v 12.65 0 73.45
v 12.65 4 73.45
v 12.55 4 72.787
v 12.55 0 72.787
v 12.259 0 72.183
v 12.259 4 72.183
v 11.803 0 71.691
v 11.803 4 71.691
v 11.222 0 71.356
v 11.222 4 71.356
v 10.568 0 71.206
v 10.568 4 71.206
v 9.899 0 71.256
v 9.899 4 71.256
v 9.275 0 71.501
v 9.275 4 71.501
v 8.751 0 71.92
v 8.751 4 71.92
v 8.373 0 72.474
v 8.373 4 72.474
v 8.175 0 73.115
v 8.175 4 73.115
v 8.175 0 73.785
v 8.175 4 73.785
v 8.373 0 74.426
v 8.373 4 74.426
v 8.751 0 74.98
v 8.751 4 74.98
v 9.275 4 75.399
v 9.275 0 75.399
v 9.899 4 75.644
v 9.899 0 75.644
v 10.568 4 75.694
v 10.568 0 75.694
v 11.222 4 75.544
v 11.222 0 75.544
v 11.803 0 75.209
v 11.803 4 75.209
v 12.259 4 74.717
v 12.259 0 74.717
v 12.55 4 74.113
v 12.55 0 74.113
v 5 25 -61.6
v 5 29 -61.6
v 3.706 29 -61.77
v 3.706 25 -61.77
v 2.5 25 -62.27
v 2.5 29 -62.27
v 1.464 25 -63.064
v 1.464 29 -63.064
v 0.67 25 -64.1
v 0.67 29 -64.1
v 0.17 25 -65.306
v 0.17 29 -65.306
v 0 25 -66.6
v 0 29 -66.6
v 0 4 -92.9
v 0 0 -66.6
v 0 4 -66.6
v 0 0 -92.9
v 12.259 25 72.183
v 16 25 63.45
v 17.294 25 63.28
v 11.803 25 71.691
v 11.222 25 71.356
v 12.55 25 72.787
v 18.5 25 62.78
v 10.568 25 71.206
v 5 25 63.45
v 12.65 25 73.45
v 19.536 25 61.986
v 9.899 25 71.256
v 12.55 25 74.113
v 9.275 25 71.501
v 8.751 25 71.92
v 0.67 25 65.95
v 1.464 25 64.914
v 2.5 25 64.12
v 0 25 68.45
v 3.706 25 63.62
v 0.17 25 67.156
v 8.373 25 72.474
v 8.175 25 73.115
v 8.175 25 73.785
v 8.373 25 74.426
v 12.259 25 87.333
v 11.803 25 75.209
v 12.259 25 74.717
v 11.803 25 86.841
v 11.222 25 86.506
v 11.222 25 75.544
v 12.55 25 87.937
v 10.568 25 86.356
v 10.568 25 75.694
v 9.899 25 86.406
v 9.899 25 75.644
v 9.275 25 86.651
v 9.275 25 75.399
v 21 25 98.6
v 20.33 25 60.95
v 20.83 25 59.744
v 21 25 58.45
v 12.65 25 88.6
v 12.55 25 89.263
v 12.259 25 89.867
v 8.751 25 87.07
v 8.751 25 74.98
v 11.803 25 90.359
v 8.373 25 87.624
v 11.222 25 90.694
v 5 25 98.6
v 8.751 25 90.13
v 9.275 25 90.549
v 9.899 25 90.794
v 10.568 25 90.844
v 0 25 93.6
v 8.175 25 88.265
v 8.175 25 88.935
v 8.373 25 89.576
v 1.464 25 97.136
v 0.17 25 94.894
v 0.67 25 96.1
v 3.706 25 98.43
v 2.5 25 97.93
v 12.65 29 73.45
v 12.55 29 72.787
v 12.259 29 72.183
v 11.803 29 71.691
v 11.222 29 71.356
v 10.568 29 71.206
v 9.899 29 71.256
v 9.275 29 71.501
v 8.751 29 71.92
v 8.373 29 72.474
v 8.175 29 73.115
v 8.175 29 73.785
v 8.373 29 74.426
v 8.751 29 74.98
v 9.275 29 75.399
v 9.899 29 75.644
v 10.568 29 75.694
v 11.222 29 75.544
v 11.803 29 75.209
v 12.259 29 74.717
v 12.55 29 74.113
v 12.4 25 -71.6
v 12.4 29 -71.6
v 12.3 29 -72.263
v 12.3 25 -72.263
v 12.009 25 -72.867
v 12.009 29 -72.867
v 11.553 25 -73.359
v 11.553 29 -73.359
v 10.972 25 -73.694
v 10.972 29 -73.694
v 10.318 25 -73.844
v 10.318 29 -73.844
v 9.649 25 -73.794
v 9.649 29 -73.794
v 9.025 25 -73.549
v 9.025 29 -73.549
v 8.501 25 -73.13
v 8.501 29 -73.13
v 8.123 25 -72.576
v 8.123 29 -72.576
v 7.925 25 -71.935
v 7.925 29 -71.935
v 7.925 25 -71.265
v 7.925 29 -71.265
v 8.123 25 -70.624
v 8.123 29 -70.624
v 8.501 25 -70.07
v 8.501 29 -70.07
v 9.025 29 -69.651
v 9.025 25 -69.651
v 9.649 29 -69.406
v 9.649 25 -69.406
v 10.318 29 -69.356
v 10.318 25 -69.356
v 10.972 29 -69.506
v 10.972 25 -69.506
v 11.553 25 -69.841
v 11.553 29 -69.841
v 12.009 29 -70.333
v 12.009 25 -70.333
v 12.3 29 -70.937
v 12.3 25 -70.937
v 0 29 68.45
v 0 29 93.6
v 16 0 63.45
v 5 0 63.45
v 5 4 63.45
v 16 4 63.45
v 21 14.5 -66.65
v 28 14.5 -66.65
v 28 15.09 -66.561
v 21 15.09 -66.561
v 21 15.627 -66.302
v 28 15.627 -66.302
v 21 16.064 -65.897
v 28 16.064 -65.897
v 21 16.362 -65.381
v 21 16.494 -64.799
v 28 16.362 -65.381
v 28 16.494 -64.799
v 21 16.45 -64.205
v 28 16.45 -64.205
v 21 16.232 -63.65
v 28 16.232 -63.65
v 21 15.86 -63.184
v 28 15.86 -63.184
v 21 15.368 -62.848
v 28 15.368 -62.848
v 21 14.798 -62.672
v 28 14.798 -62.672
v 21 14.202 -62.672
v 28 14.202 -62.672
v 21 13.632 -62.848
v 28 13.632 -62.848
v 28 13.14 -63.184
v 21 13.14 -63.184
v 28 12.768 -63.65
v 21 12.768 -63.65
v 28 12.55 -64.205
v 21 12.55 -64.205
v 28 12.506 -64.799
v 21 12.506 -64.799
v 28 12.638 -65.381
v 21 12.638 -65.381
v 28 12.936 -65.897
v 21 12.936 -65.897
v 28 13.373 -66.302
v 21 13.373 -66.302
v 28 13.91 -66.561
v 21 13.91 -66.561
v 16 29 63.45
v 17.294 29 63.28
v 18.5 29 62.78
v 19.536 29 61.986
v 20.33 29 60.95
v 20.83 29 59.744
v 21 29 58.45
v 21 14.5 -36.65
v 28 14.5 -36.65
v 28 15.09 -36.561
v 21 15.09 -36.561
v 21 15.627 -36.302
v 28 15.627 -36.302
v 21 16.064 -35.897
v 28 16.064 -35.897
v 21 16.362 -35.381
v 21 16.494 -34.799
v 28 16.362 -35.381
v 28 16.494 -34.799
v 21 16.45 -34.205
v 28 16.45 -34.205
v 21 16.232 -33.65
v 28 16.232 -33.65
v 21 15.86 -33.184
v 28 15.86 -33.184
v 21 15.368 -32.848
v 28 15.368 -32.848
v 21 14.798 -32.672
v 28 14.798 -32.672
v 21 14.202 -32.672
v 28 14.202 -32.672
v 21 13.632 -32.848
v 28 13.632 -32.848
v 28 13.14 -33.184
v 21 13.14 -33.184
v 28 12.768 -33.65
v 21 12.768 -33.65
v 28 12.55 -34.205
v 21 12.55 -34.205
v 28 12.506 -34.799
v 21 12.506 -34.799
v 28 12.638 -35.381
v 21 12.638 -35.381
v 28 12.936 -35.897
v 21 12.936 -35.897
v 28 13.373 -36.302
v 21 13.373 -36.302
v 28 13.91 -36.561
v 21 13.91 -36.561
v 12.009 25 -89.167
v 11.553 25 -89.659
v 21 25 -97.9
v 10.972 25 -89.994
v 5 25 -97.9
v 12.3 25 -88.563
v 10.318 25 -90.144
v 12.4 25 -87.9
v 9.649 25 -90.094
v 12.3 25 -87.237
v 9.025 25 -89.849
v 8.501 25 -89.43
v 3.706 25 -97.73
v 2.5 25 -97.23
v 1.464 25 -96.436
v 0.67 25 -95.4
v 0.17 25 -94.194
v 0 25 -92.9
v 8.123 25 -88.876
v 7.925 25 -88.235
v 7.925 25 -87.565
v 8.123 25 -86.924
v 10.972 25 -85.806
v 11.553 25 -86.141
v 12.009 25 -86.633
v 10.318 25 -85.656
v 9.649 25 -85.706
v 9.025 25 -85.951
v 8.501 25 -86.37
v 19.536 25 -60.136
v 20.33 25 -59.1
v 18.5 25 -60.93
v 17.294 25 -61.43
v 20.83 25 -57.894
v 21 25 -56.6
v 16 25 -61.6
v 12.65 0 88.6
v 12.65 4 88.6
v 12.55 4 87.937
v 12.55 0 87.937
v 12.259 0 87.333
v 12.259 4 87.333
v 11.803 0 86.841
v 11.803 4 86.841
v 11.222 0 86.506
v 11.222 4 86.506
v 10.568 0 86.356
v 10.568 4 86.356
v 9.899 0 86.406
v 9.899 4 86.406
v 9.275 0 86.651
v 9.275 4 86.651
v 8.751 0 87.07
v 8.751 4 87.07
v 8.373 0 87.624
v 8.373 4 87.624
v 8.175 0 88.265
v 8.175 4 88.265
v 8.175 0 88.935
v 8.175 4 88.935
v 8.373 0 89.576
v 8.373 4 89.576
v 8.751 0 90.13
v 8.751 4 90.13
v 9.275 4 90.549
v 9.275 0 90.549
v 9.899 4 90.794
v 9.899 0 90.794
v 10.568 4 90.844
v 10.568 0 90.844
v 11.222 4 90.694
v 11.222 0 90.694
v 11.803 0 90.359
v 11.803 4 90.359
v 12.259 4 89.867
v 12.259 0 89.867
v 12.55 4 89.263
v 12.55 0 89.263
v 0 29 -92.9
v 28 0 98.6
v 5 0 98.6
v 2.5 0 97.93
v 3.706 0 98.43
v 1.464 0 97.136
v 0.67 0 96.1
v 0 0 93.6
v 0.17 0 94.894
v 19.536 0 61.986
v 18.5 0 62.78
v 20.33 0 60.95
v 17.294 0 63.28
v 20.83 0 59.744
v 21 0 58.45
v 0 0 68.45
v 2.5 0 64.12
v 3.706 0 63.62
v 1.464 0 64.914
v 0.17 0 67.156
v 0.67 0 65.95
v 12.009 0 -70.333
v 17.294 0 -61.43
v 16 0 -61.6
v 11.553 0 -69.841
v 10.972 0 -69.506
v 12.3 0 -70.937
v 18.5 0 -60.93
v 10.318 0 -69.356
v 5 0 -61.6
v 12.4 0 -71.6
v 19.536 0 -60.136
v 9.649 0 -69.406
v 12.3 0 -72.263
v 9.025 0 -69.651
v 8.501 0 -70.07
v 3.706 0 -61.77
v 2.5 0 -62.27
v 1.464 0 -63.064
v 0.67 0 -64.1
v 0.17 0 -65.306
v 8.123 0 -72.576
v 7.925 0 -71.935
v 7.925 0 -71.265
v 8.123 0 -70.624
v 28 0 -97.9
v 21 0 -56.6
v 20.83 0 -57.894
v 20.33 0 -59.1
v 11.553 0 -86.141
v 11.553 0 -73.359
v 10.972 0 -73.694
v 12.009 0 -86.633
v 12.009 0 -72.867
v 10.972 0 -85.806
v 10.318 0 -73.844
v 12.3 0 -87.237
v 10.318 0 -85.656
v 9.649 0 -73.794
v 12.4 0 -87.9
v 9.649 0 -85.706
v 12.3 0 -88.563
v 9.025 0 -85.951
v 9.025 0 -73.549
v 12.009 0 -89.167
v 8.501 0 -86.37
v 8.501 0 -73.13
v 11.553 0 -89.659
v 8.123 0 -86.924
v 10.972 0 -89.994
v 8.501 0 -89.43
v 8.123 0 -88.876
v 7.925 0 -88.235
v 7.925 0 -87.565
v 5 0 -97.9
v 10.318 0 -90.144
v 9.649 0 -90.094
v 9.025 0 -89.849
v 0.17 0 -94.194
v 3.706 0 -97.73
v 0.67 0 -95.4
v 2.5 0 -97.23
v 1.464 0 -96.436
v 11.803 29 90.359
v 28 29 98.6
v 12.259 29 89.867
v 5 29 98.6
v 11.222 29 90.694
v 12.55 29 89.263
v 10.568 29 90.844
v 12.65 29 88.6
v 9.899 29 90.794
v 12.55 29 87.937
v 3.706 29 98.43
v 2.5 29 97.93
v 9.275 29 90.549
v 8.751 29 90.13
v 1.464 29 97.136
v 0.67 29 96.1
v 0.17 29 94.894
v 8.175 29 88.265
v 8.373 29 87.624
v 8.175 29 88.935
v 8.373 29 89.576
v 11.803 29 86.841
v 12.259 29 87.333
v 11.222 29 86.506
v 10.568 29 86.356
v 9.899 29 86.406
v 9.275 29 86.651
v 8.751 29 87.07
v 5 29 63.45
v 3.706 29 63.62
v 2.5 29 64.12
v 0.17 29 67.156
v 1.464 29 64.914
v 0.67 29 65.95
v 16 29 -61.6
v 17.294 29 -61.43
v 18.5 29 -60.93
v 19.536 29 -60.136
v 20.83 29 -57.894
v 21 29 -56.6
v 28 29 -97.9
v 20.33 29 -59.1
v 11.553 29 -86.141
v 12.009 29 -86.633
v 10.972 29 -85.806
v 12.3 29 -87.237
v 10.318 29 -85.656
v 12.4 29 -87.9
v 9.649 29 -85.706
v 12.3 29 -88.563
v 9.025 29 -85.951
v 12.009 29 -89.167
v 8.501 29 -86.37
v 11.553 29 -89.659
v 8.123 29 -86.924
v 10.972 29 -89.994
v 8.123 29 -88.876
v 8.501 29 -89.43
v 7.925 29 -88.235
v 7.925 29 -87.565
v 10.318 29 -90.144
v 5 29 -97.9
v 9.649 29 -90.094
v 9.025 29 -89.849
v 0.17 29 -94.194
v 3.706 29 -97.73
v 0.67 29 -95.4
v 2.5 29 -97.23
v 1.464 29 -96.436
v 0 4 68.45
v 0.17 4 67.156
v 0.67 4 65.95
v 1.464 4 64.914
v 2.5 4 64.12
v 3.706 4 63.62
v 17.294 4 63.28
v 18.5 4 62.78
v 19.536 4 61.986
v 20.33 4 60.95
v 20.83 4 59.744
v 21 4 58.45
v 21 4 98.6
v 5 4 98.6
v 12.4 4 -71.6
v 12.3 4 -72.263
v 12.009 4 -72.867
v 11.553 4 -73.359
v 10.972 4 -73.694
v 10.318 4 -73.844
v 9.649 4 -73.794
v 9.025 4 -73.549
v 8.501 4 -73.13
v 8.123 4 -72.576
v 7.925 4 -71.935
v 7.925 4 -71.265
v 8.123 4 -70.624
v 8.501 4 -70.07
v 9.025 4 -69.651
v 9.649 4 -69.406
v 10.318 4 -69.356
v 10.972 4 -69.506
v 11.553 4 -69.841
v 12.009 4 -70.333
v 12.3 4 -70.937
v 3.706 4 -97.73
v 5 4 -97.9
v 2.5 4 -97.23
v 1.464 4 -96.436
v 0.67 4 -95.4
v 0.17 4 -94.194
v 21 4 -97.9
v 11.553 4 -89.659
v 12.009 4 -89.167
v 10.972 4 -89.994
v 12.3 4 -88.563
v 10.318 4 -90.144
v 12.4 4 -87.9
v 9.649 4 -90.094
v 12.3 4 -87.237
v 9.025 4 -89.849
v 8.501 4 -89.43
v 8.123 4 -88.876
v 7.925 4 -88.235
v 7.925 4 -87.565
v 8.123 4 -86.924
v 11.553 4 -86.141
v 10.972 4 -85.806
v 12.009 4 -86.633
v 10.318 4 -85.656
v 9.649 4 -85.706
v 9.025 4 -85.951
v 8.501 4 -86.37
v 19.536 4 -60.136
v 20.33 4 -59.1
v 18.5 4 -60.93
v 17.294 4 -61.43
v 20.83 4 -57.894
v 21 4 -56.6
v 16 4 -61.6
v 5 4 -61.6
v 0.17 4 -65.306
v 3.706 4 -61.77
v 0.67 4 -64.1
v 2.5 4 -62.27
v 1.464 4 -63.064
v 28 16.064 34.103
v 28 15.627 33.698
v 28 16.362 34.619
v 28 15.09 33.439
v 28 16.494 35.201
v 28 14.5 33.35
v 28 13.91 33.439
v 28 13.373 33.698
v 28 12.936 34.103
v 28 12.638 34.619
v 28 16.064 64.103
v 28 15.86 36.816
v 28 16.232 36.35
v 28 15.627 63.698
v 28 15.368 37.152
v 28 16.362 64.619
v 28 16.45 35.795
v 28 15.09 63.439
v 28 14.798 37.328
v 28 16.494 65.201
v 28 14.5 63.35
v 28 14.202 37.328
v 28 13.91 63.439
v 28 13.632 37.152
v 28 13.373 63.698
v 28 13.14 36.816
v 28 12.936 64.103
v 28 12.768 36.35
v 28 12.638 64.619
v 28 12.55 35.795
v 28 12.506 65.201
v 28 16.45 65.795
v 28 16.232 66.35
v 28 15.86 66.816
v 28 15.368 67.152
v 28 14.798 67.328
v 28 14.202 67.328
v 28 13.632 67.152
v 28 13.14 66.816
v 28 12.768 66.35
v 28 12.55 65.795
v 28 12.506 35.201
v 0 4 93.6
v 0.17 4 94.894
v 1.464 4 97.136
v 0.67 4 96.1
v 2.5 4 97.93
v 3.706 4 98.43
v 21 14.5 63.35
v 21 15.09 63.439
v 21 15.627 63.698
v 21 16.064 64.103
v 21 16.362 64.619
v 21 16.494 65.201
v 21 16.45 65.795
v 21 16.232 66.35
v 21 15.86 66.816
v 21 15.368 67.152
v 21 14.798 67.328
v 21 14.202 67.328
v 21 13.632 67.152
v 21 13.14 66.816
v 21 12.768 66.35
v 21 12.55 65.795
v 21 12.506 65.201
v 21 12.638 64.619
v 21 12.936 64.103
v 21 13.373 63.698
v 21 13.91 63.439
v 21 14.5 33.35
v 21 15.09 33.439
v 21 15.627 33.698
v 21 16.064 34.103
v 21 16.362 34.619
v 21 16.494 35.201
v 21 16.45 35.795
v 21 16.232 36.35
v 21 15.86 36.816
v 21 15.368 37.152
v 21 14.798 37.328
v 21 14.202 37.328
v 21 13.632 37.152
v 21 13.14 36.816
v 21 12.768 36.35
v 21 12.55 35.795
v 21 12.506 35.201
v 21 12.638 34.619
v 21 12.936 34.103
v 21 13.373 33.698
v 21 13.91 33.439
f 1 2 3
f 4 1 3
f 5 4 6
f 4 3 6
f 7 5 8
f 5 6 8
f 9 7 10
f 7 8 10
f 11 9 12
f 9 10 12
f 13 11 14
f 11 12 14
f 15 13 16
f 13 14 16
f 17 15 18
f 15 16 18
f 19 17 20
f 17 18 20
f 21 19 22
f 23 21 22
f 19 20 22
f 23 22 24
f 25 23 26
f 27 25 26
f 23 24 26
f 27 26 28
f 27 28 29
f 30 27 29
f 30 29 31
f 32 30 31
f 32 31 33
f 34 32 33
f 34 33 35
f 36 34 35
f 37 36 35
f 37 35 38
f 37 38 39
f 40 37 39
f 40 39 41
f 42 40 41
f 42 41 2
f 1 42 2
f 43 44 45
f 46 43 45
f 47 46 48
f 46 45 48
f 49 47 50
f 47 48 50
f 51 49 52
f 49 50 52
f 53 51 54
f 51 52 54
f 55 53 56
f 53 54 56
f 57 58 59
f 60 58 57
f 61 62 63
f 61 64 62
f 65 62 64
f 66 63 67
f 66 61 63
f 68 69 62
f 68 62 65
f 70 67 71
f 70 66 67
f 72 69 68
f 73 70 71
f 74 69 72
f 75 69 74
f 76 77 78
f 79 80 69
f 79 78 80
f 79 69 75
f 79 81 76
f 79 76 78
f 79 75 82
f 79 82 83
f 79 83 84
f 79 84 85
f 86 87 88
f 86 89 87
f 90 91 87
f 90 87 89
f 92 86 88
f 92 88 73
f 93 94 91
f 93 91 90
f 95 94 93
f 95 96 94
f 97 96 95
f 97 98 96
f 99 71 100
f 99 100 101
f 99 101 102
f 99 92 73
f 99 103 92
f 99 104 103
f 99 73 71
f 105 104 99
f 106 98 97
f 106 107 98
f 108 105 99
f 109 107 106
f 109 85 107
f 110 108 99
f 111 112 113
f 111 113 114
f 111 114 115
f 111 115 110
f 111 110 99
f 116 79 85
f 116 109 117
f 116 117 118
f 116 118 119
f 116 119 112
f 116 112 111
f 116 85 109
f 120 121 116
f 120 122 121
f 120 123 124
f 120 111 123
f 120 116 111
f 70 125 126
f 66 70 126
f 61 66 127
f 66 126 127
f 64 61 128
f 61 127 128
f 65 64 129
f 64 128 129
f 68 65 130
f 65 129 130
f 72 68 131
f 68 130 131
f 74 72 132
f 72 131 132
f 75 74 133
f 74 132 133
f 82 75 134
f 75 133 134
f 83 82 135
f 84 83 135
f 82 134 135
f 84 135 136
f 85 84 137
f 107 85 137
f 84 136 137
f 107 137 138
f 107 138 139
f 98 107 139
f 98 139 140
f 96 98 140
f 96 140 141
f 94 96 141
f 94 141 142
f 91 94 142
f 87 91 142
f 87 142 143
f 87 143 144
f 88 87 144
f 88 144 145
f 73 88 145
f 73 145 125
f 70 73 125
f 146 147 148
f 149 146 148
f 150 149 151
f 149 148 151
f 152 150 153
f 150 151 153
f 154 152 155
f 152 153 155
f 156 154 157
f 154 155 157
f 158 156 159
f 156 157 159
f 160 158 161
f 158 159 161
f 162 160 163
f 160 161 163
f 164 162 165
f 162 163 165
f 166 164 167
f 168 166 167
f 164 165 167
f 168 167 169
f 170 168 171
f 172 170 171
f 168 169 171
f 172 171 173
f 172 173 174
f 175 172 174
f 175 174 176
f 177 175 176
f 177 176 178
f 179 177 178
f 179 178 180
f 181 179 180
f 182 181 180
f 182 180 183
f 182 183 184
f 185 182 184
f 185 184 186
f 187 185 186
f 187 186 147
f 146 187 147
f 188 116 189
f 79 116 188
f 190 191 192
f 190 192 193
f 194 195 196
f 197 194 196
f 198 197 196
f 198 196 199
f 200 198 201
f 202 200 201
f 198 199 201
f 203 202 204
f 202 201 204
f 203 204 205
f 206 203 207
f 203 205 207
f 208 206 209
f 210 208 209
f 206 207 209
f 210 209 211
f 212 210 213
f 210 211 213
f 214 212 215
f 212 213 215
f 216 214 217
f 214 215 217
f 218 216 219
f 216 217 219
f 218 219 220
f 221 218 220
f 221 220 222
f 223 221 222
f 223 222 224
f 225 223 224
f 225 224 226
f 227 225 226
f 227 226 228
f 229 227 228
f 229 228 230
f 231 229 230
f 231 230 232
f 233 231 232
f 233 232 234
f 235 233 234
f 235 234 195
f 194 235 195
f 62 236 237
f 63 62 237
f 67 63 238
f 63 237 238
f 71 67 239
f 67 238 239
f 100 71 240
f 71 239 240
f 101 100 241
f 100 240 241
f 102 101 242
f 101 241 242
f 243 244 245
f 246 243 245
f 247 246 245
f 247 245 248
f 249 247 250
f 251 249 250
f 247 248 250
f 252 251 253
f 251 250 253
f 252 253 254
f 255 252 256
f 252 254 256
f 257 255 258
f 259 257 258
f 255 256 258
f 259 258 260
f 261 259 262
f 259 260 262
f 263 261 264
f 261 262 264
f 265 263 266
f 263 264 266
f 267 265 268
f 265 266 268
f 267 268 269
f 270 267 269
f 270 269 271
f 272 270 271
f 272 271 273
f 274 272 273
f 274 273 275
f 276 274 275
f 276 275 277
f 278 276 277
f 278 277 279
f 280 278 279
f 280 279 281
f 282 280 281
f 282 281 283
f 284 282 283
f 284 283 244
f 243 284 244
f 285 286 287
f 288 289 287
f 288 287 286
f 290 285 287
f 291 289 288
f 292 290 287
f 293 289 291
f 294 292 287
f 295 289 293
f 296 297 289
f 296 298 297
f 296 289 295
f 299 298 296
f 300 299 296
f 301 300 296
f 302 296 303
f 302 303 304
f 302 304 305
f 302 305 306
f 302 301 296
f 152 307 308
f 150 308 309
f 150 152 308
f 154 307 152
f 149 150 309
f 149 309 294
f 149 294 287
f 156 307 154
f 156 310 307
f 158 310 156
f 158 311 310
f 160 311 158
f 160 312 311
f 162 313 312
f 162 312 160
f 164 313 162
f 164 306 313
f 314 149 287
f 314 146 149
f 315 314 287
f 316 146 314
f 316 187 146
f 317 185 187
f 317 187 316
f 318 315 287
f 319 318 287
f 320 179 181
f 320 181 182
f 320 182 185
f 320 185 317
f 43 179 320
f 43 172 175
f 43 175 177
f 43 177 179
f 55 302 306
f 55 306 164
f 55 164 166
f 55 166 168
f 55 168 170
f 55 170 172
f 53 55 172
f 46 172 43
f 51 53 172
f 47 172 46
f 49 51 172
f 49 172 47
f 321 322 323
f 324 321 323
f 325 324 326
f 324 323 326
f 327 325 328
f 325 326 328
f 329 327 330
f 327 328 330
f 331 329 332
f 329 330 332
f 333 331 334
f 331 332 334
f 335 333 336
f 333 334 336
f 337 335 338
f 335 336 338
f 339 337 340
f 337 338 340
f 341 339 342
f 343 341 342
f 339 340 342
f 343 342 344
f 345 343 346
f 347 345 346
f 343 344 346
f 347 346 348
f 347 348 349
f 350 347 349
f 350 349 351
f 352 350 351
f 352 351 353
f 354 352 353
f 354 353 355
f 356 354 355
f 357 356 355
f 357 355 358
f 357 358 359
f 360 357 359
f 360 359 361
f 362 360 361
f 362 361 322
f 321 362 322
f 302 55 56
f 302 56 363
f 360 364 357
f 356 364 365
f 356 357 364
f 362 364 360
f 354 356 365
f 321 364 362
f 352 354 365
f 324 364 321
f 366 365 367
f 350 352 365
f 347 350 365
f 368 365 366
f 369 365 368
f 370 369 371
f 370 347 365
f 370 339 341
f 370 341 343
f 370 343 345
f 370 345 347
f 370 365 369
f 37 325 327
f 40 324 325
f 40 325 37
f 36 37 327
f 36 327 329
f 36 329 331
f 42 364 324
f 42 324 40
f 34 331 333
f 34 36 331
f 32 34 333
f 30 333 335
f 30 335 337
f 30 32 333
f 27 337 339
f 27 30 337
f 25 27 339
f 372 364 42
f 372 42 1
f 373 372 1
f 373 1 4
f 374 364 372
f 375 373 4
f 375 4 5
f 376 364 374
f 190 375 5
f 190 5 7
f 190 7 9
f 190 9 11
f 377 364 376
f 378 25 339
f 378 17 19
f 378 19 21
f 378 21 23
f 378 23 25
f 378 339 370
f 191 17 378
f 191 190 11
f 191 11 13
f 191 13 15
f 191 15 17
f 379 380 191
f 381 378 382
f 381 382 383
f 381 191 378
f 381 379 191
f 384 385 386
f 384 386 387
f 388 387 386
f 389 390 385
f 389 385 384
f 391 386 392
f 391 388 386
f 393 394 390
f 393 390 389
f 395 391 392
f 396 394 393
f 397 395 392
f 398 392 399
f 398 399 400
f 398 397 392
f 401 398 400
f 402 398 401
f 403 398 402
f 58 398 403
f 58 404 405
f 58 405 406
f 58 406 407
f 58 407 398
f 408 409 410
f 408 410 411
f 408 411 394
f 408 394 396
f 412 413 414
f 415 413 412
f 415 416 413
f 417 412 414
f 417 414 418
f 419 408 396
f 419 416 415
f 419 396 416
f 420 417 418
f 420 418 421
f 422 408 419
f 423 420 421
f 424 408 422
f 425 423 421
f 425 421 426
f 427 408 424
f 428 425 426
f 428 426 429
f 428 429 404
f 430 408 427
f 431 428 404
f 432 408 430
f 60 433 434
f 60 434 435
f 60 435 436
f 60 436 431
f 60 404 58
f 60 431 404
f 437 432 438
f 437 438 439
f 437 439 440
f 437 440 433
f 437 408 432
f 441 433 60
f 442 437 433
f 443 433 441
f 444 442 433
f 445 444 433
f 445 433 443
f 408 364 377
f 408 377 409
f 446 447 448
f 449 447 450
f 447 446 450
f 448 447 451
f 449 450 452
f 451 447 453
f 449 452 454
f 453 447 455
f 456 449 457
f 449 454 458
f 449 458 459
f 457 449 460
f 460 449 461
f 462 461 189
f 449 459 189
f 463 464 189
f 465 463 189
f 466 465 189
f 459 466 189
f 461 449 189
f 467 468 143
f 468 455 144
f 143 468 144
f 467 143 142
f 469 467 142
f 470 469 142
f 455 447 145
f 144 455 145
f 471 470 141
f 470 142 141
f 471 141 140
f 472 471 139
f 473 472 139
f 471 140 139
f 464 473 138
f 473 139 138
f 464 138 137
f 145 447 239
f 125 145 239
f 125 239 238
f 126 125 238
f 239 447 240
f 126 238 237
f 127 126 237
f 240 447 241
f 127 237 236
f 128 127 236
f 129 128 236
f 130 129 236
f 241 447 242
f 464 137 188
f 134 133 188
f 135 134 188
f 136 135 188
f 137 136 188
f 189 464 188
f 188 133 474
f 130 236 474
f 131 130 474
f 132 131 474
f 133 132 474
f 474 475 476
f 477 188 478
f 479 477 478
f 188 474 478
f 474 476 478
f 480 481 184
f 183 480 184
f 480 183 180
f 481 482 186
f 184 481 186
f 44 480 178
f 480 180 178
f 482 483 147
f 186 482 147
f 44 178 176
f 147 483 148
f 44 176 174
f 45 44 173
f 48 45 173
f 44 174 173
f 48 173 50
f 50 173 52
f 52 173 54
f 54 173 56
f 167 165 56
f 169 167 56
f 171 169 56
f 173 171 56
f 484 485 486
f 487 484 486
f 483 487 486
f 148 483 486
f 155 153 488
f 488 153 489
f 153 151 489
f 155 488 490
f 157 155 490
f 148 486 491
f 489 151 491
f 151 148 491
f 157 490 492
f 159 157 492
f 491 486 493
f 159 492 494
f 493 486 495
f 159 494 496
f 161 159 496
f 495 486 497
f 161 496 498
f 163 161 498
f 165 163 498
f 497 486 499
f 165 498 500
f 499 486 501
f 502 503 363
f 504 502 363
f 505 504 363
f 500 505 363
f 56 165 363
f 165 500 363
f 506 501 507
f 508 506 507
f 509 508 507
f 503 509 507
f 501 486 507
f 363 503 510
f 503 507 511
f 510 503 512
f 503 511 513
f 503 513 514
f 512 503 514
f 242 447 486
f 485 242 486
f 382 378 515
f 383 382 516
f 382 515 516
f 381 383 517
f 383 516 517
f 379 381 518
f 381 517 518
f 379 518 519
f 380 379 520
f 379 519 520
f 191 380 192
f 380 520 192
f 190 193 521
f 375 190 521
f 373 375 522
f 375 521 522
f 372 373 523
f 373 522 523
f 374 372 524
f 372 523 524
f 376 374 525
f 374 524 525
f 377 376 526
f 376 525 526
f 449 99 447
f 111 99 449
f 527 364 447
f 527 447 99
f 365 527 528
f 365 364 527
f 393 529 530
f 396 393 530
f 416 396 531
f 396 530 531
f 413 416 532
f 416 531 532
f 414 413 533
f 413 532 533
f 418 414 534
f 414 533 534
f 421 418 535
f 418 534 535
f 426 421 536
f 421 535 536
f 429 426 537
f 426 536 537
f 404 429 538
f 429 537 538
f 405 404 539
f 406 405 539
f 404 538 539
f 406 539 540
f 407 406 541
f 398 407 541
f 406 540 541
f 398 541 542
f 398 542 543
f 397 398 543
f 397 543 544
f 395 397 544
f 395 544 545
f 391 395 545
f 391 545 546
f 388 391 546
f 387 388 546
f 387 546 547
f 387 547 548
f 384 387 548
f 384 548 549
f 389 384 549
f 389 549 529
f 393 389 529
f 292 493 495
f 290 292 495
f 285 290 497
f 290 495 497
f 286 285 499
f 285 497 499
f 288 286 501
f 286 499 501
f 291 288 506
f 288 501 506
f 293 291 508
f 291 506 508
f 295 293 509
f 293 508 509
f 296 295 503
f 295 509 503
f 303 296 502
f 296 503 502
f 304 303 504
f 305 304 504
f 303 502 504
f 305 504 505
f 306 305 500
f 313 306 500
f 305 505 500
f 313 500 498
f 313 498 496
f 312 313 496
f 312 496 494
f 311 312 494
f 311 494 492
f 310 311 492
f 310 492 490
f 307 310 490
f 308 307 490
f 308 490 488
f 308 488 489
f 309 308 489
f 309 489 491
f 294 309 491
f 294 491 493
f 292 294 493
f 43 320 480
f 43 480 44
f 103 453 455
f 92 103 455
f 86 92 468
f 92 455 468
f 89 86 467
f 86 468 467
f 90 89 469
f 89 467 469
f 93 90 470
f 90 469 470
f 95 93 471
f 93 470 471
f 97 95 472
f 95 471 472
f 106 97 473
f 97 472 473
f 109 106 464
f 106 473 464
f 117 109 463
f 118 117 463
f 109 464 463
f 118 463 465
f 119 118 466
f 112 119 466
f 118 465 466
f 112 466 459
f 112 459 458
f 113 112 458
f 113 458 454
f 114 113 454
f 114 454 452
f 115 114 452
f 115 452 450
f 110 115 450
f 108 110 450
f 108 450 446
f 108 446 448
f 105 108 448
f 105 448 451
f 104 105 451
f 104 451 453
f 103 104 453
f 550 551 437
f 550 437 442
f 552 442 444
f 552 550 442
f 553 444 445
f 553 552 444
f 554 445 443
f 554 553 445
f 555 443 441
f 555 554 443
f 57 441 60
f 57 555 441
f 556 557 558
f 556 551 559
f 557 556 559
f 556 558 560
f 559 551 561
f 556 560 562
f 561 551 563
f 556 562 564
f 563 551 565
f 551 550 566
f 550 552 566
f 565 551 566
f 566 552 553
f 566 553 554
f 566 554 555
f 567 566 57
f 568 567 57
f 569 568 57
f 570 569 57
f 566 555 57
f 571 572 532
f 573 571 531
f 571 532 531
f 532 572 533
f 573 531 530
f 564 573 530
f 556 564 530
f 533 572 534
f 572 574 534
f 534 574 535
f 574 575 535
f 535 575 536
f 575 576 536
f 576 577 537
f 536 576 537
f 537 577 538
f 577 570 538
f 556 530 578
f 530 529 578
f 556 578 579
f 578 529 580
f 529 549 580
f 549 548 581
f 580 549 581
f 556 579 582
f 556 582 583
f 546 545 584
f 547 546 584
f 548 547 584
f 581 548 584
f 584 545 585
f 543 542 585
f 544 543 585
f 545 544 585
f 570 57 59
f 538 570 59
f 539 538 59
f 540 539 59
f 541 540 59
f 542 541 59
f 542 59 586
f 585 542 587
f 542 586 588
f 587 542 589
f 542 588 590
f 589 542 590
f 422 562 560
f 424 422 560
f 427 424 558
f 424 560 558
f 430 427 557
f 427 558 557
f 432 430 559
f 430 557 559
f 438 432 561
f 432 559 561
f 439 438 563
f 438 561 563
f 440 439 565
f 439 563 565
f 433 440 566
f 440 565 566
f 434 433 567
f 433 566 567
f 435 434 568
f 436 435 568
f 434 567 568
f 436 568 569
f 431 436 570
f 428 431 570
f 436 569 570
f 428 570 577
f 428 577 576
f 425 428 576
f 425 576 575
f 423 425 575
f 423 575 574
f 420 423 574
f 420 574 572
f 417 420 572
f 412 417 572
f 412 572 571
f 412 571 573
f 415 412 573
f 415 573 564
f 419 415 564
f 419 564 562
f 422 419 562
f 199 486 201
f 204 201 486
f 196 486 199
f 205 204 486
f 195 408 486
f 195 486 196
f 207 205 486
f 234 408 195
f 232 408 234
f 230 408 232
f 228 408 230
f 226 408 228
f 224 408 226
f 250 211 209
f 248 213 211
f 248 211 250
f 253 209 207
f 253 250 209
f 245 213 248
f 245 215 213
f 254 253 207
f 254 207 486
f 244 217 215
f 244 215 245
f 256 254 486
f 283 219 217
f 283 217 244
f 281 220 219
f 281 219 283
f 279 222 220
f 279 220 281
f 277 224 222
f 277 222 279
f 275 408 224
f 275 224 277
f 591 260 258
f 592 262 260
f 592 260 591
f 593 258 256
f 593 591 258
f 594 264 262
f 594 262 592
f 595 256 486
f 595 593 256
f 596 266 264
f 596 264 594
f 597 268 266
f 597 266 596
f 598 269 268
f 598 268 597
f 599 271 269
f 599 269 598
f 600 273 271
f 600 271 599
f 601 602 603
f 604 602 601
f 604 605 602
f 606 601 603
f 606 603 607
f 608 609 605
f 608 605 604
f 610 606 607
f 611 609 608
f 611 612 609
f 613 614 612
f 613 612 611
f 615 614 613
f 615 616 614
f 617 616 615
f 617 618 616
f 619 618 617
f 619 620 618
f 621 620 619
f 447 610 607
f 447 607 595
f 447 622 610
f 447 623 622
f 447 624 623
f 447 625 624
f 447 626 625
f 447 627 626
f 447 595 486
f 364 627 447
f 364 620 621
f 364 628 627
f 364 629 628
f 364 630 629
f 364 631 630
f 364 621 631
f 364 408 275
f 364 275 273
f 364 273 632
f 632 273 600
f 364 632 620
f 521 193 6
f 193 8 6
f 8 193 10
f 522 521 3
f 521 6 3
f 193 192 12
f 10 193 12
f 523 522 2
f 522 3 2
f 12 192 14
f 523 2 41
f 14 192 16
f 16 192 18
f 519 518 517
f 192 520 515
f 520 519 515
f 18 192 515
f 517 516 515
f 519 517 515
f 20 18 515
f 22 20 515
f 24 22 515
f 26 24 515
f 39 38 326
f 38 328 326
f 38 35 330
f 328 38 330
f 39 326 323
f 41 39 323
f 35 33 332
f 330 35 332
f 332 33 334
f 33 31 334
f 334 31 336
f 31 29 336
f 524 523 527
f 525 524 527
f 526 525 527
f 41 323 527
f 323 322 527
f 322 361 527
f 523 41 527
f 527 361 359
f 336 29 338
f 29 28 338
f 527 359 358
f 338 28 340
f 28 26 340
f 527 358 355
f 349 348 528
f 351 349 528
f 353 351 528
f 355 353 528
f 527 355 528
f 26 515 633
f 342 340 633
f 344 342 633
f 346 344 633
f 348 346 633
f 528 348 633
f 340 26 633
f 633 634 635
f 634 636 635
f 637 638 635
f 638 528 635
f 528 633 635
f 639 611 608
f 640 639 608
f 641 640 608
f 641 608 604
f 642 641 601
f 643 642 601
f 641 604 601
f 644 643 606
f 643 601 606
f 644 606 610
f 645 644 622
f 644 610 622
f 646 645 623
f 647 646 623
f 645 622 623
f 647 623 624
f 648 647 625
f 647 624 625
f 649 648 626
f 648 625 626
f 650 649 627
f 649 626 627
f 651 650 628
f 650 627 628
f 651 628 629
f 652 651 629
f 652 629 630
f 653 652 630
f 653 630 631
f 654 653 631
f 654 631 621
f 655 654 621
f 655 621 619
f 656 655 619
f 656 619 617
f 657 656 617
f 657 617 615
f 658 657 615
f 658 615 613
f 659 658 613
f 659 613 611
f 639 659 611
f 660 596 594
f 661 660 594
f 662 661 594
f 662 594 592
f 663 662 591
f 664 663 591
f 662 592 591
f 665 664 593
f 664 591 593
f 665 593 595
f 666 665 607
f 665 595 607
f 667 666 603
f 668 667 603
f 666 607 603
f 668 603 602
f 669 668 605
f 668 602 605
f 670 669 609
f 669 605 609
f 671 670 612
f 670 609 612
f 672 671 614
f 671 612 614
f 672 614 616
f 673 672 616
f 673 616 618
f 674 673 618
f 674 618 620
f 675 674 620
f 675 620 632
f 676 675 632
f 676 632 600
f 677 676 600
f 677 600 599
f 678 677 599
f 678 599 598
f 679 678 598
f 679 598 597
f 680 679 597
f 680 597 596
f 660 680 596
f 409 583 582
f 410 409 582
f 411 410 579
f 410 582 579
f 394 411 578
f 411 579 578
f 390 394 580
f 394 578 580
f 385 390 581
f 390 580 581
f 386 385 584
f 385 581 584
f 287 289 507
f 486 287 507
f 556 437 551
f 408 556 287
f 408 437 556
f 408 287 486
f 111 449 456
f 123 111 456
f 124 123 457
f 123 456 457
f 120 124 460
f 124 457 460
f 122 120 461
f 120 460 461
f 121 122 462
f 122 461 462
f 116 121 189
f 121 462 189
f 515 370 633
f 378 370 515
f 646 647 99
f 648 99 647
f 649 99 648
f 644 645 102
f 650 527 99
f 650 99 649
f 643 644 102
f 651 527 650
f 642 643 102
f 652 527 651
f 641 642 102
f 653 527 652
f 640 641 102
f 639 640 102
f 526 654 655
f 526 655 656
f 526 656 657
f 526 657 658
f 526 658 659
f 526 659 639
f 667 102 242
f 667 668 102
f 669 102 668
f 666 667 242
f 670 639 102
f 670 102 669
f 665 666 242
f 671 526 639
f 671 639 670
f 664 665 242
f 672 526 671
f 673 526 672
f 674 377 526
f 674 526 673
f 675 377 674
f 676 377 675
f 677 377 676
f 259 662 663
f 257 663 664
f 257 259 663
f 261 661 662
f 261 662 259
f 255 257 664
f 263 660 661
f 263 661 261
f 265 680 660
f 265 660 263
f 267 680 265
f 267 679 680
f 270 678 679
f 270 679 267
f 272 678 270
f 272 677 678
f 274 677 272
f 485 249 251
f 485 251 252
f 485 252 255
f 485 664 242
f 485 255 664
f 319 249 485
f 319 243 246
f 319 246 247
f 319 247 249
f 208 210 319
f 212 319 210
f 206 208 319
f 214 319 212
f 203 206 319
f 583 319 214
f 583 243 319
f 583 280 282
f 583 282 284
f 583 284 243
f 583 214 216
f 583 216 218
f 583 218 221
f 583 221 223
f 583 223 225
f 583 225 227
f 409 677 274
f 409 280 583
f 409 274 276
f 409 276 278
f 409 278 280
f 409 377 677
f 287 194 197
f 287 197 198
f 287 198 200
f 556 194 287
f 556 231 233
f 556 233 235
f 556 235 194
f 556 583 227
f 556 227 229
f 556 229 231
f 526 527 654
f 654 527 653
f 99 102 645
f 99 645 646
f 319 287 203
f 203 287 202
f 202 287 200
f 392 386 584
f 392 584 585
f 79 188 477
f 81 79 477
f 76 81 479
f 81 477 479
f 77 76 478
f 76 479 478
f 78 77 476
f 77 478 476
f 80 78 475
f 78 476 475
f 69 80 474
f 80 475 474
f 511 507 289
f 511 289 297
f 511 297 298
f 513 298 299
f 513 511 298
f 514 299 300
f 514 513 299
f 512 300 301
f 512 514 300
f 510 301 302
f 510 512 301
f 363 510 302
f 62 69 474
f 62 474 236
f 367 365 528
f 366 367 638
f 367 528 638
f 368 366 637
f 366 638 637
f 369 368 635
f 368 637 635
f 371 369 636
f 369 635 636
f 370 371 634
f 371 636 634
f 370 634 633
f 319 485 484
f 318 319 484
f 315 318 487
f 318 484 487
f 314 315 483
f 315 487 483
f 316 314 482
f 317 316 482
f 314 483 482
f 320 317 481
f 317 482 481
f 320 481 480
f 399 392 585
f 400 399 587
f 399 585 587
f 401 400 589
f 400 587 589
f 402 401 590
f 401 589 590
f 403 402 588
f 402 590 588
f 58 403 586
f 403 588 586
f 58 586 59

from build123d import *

# Parameters (mm, degrees)
BOSS_EXTRUDE1_DEPTH   = 29
FILLET1_R             = 5
CUT_EXTRUDE1_REACH    = 108.522
SKETCH3_W             = 196.5
SKETCH3_H             = 21
M4_CLEARANCE_HOLE1_D  = 4.5
F_4_0MM_DOWEL_HOLE1_D = 4


with BuildPart() as part:
    # Sketch2 → Boss-Extrude1 (new body)
    with BuildSketch(Plane(origin=(0, 0, 0), x_dir=(1, 0, 0), z_dir=(0, 1, 0))):
        Polygon((0, 97.9), (28, 97.9), (28, -98.6), (0, -98.6), (0, -63.45), (21, -63.45), (21, 61.6), (0, 61.6), align=None)
    extrude(amount=BOSS_EXTRUDE1_DEPTH)

    # Fillet1
    fillet1_edges = [part.edges().sort_by_distance(p)[0] for p in [
        (0, 14.5, -97.9),
        (0, 14.5, 98.6),
        (0, 14.5, 63.45),
        (21, 14.5, 63.45),
        (21, 14.5, -61.6),
        (0, 14.5, -61.6),
    ]]
    fillet(fillet1_edges, radius=FILLET1_R)

    # Cut-Extrude1: up to this face of the body (flat: up to its plane)
    cut_extrude1_end = Plane(part.part.faces().sort_by_distance((21, 14.5, 0.925))[0])
    # Sketch3 → Cut-Extrude1 (cut, up to the picked face)
    with BuildSketch(Plane.ZY, mode=Mode.PRIVATE) as cut_extrude1_sk1:
        with Locations((0.35, 14.5)):
            Rectangle(SKETCH3_W, SKETCH3_H)
    cut_extrude1_tool1 = split(extrude(cut_extrude1_sk1.sketch, amount=-CUT_EXTRUDE1_REACH, mode=Mode.PRIVATE), bisect_by=cut_extrude1_end, keep=Keep.BOTH, mode=Mode.PRIVATE)
    add(cut_extrude1_tool1.solids().sort_by(Axis((0, 14.5, 0.35), (1, 0, 0)))[0], mode=Mode.SUBTRACT)

    # M4 Clearance Hole1 (through all)
    with Locations(Plane(origin=(0, 0, 0), x_dir=(-1, 0, 0), z_dir=(0, -1, 0))):
        with Locations((-10.15, 87.9), (-10.15, 71.6), (-10.4, -73.45), (-10.4, -88.6)):
            Hole(M4_CLEARANCE_HOLE1_D / 2)

    # Ø4.0mm Dowel Hole1 (through all)
    with Locations(Plane.ZY.offset(-21)):
        with Locations((65.35, 14.5), (-34.65, 14.5), (-64.65, 14.5), (35.35, 14.5)):
            Hole(F_4_0MM_DOWEL_HOLE1_D / 2)


solid = part.part
